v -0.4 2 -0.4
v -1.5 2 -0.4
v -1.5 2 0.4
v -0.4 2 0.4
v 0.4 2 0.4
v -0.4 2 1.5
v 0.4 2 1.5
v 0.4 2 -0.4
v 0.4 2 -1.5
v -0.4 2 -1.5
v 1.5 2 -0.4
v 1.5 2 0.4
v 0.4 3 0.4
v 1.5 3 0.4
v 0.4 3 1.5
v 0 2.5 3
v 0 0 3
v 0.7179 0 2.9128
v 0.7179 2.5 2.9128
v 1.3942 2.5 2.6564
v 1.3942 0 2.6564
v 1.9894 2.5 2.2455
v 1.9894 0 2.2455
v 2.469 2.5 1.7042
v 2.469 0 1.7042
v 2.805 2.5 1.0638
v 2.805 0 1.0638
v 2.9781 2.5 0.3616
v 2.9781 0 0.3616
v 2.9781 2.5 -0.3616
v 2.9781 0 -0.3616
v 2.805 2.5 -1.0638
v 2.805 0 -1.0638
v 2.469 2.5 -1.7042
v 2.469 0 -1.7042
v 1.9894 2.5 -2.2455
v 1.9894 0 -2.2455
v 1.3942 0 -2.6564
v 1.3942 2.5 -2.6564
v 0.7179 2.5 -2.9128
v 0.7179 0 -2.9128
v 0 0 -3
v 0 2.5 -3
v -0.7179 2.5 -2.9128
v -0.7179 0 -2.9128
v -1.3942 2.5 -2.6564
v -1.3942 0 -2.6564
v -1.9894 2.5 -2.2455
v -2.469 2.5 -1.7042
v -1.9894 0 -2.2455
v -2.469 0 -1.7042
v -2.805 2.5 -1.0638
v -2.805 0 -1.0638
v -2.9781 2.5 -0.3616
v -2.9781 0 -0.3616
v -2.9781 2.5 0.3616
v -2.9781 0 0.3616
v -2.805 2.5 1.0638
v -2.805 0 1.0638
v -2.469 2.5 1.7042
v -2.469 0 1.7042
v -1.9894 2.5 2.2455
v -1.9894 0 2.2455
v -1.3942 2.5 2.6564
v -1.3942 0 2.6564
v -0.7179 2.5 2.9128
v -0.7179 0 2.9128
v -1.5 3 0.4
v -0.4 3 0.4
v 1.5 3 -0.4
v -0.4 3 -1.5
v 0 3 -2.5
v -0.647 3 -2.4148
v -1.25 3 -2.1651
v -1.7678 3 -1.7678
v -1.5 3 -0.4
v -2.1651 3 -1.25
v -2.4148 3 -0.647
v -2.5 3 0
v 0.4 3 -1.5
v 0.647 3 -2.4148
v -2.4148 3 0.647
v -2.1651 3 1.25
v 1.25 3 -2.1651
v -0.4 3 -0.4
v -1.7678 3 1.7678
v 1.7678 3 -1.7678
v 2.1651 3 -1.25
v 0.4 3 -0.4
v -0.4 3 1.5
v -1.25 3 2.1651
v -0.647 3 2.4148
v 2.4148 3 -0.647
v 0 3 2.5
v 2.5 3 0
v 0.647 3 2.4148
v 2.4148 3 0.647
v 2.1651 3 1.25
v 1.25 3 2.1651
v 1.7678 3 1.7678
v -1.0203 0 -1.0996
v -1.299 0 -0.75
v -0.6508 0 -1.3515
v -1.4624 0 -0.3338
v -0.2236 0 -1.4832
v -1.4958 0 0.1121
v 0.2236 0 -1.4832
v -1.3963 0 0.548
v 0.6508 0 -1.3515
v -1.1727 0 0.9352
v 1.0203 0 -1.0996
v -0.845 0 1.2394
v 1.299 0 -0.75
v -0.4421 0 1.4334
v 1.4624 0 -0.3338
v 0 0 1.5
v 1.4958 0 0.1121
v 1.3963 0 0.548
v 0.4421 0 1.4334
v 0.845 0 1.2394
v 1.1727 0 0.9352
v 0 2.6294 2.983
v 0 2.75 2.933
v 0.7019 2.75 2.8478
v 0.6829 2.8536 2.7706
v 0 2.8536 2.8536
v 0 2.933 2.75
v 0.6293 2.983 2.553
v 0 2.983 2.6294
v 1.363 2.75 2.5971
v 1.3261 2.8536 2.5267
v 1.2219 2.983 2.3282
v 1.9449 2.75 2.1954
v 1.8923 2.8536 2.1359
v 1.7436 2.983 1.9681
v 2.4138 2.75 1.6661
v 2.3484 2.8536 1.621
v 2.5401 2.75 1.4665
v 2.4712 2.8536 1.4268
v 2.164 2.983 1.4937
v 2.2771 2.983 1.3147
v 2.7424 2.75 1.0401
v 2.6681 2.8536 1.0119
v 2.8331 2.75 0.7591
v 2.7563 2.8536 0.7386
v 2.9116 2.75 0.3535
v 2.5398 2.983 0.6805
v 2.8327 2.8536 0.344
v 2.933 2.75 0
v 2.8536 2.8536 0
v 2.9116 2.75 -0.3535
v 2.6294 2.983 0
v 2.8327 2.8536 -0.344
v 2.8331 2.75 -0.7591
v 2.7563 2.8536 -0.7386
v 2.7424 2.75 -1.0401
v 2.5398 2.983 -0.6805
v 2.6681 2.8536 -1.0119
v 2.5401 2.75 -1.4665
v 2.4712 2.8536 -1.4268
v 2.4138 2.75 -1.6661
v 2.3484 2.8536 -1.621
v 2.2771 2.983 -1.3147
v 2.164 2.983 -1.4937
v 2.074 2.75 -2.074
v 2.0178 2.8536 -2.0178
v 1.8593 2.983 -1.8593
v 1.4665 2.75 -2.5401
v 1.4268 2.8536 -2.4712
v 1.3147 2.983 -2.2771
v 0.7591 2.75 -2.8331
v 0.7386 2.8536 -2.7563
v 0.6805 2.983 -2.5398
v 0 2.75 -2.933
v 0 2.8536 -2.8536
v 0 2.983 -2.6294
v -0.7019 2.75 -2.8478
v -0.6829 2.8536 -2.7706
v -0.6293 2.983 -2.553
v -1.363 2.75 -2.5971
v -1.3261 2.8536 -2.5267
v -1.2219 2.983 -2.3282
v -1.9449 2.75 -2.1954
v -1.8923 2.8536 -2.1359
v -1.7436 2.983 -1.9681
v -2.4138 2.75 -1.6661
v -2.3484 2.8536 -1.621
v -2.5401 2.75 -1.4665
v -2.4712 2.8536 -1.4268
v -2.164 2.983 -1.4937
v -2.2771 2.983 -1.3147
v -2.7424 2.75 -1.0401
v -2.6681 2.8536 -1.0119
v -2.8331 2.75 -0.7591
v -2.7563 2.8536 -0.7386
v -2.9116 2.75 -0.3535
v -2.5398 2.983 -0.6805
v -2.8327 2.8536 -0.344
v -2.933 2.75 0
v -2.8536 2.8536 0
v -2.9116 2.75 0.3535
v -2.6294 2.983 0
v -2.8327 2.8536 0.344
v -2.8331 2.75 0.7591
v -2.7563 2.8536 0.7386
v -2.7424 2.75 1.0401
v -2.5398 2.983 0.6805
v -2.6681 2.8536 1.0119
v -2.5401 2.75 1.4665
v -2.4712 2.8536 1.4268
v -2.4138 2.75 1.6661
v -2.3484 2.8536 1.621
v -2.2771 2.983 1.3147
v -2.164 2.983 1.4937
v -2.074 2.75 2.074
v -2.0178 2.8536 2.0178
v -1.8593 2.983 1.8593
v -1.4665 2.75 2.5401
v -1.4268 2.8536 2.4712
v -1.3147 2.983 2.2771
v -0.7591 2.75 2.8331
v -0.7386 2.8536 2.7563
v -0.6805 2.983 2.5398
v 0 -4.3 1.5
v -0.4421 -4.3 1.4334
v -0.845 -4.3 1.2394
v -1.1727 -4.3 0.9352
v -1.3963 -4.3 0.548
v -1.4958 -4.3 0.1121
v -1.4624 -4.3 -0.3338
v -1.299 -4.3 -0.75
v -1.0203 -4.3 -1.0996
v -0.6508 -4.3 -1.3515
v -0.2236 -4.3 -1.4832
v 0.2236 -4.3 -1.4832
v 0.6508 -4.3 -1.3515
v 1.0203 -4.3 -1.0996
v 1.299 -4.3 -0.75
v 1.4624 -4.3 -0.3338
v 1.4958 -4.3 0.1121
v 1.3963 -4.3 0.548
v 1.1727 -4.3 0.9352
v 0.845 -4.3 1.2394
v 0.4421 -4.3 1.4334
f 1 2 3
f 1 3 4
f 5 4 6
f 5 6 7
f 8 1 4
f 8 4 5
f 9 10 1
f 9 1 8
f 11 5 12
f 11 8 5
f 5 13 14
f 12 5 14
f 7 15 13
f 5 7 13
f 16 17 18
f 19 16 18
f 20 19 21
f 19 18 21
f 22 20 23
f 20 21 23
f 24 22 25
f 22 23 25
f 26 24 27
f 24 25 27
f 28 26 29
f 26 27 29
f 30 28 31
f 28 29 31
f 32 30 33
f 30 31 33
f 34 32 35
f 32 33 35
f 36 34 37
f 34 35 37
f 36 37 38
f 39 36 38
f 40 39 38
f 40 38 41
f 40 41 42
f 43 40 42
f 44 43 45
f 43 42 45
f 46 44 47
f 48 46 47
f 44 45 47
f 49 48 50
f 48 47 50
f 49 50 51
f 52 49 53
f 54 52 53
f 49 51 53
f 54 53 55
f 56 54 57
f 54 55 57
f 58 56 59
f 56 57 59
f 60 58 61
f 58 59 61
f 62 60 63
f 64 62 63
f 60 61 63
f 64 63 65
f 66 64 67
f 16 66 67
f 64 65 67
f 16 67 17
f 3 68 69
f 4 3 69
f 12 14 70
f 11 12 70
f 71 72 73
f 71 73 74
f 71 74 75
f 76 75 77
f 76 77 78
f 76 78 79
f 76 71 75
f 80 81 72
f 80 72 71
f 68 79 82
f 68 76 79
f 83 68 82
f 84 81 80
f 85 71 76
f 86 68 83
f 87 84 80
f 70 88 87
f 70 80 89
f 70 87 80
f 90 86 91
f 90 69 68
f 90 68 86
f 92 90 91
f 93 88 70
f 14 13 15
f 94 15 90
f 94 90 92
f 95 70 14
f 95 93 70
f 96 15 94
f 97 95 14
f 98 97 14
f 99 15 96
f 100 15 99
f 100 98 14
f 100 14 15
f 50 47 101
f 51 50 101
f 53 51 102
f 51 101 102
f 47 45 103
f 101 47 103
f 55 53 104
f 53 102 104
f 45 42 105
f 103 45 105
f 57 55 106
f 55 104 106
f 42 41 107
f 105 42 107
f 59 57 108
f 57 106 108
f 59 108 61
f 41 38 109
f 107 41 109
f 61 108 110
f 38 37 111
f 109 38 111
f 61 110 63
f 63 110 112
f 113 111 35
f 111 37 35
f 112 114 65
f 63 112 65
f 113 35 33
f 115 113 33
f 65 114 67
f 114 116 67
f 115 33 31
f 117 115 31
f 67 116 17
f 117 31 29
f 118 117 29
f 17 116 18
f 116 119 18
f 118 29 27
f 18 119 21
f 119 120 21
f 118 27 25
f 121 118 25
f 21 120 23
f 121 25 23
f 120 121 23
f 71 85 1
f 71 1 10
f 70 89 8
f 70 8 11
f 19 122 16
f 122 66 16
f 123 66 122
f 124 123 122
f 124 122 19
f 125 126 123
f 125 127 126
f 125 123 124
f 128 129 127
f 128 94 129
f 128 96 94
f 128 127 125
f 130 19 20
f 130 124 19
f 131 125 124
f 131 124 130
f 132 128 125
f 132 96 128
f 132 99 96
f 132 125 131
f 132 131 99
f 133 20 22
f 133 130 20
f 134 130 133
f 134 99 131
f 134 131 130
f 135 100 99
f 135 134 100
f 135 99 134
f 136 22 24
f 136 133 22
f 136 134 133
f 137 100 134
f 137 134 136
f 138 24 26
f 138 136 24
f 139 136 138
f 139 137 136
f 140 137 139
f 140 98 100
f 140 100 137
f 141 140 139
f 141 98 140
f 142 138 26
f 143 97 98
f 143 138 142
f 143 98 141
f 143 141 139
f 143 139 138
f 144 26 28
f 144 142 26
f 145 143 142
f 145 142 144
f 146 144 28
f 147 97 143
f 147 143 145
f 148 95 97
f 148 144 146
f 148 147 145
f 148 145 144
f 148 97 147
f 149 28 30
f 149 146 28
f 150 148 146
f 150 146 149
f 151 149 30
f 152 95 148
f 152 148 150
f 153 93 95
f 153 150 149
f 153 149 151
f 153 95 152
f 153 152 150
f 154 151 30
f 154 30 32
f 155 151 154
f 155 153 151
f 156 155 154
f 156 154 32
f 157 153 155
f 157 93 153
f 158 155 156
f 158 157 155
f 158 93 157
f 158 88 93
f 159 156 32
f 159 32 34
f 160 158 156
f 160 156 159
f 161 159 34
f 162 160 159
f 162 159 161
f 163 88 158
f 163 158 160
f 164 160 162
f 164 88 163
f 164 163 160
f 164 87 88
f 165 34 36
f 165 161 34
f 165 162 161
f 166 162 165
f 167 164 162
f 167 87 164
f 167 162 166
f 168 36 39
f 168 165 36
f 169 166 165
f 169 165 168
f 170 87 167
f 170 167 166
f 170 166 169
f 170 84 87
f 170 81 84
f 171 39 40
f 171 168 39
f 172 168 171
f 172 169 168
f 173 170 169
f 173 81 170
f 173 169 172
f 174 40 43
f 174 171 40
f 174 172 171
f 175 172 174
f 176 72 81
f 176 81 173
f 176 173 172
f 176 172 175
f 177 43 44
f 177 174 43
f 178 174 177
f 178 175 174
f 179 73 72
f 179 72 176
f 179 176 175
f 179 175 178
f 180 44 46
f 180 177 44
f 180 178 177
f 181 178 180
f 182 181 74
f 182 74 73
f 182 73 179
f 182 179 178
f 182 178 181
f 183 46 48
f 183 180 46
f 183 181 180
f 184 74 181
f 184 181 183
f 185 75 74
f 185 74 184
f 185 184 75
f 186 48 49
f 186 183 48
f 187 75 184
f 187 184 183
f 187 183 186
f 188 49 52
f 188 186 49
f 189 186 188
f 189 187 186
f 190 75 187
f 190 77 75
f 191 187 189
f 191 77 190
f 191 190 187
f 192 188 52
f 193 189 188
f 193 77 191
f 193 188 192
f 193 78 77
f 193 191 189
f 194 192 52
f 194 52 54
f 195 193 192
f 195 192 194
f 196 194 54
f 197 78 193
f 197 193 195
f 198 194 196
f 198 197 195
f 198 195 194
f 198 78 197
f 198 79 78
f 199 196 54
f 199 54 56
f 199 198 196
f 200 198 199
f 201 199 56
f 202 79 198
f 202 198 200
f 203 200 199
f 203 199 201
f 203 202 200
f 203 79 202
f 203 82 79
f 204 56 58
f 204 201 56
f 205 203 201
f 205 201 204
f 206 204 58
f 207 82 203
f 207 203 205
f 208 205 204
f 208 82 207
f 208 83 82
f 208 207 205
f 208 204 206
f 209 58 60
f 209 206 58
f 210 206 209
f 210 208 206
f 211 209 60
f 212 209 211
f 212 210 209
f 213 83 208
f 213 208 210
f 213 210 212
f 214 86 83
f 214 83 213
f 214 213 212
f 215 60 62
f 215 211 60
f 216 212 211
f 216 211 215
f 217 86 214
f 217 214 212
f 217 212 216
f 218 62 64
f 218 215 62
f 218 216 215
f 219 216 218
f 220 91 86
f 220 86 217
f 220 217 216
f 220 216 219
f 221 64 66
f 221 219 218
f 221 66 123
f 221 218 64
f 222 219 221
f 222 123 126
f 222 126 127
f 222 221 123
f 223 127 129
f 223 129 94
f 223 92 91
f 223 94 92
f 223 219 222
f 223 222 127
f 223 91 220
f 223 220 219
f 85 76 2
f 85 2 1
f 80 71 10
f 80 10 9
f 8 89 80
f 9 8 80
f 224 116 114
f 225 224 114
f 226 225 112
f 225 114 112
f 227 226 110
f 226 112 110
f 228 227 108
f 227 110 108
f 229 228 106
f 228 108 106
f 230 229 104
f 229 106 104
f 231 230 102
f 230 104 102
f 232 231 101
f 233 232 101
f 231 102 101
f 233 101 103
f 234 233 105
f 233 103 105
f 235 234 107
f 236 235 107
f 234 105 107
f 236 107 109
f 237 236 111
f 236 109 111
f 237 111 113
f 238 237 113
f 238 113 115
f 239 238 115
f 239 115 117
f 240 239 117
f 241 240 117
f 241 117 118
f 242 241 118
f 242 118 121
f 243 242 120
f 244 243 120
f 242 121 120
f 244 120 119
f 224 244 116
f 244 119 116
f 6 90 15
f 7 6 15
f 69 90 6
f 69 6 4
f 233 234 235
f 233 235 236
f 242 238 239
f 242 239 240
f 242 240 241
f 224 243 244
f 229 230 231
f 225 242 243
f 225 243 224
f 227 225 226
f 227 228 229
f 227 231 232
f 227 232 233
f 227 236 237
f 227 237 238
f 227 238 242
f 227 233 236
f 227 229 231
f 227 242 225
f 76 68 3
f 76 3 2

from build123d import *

# Parameters (mm, degrees)
SKETCH1_R           = 3
BOSS_EXTRUDE1_DEPTH = 3
SKETCH2_R           = 1.5
BOSS_EXTRUDE2_DEPTH = 4.3
FILLET1_R           = 0.5
SKETCH3_W           = 0.8
SKETCH3_H           = 1.1
SKETCH3_W_2         = 1.1
SKETCH3_H_2         = 0.8
CUT_EXTRUDE1_DEPTH  = 1


with BuildPart() as part:
    # Sketch1 → Boss-Extrude1 (new body)
    with BuildSketch(Plane(origin=(0, 0, 0), x_dir=(1, 0, 0), z_dir=(0, 1, 0))):
        with Locations(Location((0, 0, 0), (0, 0, 270))):
            Circle(SKETCH1_R)
    extrude(amount=BOSS_EXTRUDE1_DEPTH)

    # Sketch2 → Boss-Extrude2 (add)
    with BuildSketch(Plane.XZ):
        with Locations(Location((0, 0, 0), (0, 0, 90))):
            Circle(SKETCH2_R)
    extrude(amount=BOSS_EXTRUDE2_DEPTH)

    # Fillet1
    fillet1_edges = [part.edges().sort_by_distance(p)[0] for p in [
        (0, 3, -3),
    ]]
    fillet(fillet1_edges, radius=FILLET1_R)

    # Sketch3 → Cut-Extrude1 (cut)
    with BuildSketch(Plane(origin=(0, 3, 0), x_dir=(1, 0, 0), z_dir=(0, 1, 0))):
        with Locations((0, 0.95)):
            Rectangle(SKETCH3_W, SKETCH3_H)
        with Locations((0.95, 0)):
            Rectangle(SKETCH3_W_2, SKETCH3_H_2)
        with Locations((0, -0.95)):
            Rectangle(SKETCH3_W, SKETCH3_H)
        with Locations((-0.95, 0)):
            Rectangle(SKETCH3_W_2, SKETCH3_H_2)
        Rectangle(SKETCH3_W, SKETCH3_H_2)
    extrude(amount=-CUT_EXTRUDE1_DEPTH, mode=Mode.SUBTRACT)


solid = part.part
